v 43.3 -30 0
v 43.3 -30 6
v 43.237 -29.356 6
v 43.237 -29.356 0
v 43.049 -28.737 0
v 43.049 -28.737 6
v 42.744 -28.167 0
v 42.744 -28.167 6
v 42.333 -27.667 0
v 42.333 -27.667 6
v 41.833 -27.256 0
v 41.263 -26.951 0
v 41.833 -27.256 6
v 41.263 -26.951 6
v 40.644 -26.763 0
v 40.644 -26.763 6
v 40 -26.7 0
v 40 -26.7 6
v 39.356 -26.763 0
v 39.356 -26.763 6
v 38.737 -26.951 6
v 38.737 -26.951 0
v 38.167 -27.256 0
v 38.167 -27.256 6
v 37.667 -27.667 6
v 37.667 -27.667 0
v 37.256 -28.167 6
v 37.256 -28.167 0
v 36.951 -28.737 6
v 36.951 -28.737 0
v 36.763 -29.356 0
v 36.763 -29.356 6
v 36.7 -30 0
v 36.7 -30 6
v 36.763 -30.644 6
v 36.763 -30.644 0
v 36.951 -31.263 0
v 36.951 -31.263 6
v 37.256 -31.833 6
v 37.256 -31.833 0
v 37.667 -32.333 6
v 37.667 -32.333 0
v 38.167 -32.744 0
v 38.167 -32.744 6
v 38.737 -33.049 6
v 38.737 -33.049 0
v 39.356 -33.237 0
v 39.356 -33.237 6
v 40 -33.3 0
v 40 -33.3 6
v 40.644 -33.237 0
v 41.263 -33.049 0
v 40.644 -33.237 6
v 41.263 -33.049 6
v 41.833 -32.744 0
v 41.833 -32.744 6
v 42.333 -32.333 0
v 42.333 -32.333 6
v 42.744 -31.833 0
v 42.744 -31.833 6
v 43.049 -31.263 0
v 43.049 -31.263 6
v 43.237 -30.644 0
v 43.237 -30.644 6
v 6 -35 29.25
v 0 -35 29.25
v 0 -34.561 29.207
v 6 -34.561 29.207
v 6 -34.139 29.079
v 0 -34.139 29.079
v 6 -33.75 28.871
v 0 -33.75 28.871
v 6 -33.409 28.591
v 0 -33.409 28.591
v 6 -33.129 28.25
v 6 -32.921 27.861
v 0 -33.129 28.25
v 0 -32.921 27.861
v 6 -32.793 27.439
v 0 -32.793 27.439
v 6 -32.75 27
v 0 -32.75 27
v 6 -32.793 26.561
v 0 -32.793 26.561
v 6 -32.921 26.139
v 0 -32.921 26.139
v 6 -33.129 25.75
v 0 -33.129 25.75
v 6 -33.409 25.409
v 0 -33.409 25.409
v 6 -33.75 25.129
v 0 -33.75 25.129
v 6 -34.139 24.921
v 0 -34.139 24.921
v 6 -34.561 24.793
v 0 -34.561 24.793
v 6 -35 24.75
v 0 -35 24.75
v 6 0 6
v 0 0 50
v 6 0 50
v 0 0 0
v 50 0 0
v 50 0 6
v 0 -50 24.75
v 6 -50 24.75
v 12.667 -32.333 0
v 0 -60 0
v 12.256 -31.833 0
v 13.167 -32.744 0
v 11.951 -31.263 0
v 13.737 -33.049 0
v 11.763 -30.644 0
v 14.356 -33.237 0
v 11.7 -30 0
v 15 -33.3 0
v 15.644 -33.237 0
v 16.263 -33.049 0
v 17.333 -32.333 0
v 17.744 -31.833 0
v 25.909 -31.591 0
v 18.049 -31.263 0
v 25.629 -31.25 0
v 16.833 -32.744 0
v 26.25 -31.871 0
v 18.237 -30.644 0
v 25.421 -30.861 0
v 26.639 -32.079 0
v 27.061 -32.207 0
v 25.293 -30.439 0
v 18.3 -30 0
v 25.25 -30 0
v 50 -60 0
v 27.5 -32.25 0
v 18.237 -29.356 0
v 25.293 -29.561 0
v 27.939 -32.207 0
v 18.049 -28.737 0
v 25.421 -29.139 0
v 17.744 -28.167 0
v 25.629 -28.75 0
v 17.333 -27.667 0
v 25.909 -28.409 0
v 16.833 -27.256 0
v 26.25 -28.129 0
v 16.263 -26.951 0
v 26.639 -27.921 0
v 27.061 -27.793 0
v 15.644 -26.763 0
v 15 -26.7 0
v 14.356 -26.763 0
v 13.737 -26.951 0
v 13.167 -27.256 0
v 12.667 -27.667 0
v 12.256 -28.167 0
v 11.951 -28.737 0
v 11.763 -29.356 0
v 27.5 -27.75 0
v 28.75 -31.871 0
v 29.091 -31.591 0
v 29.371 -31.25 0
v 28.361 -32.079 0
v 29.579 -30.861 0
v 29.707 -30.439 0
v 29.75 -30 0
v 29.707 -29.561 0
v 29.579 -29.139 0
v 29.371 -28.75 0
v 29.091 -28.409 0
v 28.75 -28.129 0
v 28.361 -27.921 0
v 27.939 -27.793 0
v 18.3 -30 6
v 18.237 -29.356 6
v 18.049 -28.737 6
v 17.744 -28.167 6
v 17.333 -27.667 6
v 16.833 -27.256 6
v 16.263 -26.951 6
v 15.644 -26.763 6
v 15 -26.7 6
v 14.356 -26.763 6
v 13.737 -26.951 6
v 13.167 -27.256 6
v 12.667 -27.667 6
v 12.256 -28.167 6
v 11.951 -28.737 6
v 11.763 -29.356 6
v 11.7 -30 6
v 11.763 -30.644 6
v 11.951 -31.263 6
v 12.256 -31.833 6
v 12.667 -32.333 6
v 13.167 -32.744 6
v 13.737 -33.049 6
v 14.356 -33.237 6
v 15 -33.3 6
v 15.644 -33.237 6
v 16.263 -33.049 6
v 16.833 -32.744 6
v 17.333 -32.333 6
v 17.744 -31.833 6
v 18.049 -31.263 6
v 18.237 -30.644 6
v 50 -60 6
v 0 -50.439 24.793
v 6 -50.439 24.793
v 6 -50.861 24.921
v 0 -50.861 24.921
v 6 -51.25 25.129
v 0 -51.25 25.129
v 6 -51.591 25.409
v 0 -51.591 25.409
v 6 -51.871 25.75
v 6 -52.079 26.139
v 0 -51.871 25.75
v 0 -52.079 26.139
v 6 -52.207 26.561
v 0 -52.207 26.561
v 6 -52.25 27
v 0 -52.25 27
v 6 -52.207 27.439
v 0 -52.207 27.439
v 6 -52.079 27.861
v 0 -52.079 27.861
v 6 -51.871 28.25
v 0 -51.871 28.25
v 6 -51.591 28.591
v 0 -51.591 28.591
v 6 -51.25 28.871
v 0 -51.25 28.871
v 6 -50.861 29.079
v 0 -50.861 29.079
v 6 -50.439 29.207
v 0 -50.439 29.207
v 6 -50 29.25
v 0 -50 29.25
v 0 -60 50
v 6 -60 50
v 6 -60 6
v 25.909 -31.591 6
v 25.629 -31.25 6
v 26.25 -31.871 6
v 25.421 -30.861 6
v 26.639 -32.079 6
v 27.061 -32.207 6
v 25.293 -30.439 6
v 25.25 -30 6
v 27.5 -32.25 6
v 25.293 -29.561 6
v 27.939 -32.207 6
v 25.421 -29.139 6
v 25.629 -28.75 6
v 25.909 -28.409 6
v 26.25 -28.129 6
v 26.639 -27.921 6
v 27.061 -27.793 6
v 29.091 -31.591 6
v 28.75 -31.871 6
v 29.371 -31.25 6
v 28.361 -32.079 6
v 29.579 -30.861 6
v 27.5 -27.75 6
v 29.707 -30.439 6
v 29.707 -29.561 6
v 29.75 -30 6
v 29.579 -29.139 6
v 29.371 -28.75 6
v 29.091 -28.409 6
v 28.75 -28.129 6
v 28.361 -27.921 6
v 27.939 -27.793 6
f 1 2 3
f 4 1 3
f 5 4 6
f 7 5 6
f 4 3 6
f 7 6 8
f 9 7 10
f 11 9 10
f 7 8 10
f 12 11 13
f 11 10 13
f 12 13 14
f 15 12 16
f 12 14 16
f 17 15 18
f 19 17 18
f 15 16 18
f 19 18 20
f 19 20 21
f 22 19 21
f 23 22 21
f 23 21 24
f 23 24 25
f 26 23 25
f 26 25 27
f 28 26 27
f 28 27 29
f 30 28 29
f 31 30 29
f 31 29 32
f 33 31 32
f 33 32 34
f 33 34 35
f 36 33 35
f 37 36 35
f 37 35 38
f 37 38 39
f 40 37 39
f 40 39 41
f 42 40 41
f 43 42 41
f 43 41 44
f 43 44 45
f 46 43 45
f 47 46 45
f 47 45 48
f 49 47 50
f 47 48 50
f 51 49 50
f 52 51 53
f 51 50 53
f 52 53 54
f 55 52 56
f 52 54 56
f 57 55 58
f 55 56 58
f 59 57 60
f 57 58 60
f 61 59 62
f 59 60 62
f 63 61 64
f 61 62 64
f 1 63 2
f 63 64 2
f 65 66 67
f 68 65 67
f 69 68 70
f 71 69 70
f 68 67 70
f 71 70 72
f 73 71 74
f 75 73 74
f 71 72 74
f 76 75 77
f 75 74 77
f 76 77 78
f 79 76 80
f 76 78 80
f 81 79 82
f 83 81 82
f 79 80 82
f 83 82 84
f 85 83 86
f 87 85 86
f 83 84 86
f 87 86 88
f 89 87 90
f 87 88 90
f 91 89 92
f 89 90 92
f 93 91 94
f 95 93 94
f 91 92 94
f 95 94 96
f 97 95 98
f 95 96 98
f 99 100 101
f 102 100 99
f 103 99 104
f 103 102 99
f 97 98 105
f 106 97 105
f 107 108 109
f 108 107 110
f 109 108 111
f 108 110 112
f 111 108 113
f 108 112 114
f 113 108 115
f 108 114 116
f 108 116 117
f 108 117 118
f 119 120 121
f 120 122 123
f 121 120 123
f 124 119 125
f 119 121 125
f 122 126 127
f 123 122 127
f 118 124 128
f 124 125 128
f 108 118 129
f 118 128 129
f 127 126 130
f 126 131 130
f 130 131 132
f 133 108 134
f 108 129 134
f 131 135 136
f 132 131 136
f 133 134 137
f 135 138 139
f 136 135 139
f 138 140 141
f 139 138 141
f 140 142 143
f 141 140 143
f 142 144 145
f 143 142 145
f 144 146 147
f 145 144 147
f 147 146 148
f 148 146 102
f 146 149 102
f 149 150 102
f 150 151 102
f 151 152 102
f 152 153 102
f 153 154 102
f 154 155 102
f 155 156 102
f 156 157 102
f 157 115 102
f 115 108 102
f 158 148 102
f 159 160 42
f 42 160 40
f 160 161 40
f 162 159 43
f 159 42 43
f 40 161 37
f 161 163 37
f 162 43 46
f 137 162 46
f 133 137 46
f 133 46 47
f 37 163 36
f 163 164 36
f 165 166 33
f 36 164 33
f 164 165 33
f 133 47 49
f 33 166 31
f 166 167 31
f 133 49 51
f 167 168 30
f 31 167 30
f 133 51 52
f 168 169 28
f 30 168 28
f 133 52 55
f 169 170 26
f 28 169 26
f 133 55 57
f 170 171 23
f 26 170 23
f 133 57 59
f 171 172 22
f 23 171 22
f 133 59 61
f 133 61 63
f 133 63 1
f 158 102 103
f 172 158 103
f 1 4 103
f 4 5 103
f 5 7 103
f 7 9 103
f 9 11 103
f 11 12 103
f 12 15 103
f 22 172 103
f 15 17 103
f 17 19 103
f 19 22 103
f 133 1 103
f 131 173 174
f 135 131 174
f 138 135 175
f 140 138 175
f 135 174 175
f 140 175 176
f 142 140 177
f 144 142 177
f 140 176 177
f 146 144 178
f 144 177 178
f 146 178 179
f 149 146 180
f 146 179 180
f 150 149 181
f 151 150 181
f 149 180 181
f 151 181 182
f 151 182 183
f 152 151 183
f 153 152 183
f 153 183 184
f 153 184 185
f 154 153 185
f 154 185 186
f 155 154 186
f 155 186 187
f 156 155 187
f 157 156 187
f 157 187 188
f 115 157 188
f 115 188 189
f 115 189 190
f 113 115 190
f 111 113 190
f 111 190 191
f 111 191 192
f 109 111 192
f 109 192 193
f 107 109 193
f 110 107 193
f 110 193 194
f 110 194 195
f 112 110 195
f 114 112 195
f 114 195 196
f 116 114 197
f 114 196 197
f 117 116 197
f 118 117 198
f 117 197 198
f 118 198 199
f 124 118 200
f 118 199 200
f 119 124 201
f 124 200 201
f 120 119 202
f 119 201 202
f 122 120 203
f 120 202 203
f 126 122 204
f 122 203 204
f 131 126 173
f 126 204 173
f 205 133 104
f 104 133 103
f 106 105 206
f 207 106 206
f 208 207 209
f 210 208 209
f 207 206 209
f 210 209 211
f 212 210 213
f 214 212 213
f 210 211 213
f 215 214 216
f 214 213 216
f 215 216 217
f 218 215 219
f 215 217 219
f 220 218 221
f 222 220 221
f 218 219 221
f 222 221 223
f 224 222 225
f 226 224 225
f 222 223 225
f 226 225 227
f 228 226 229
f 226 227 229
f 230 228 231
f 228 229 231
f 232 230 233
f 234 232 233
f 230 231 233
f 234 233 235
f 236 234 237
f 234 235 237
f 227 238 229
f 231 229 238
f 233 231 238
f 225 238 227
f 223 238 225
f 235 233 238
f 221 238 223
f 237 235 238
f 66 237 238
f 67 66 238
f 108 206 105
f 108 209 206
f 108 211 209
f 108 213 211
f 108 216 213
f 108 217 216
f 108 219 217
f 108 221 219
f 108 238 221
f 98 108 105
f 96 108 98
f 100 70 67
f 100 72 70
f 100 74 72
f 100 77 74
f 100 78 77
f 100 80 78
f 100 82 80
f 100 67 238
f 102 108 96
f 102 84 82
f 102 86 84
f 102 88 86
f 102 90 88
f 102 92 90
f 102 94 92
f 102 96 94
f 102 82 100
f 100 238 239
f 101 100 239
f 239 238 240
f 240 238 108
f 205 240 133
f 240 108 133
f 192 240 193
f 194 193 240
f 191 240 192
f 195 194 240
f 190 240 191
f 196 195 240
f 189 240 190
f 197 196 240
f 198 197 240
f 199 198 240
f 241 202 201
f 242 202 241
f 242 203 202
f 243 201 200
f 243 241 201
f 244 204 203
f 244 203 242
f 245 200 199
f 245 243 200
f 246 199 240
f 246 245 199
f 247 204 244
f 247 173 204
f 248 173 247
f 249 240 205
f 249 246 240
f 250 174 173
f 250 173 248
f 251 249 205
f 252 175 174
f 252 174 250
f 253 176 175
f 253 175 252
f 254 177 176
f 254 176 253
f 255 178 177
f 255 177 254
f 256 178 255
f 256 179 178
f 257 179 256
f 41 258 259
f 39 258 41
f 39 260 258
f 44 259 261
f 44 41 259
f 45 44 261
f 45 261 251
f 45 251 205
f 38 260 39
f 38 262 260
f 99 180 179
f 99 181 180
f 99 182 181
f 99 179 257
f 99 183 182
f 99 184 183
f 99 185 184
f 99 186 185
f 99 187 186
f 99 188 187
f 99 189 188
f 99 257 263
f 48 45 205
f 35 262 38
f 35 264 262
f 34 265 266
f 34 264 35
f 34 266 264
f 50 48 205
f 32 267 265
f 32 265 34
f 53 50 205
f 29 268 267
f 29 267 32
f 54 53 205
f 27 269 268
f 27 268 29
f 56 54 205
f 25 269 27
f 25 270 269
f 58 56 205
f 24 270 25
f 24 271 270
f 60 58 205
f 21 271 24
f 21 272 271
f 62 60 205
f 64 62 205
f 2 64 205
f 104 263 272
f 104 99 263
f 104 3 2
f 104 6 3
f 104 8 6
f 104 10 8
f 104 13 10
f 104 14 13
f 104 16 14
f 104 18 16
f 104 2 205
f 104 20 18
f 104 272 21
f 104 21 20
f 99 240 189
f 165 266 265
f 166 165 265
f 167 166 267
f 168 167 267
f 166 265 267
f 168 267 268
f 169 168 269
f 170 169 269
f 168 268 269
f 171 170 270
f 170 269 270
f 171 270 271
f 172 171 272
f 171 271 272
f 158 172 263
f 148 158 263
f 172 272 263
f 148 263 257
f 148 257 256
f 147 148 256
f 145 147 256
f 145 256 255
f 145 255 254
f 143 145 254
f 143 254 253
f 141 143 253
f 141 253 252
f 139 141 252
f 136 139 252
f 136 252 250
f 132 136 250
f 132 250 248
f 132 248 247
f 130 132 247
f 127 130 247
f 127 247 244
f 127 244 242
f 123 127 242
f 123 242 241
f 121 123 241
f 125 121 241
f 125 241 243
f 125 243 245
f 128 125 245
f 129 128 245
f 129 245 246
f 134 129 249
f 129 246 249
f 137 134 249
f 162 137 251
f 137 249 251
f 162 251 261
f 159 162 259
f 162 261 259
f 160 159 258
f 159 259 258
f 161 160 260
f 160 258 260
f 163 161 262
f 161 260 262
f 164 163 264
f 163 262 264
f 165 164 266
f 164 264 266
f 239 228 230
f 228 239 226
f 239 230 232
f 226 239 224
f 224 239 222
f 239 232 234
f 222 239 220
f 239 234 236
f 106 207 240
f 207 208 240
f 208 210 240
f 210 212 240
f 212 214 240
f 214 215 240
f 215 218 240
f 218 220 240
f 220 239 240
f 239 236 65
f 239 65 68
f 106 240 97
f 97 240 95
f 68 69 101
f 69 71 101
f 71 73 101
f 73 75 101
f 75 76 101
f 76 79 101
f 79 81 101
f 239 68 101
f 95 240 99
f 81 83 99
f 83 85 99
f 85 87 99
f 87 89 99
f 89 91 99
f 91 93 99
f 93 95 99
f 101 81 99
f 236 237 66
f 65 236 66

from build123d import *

# Parameters (mm, degrees)
F0_W     = 50
F0_H     = 60
F1_DEPTH = 6
F2_W     = 6
F2_H     = 60
F3_DEPTH = 44
F5_DEPTH = 50.001
F6_R     = 2.25
F6_R_2   = 3.3
F7_DEPTH = 25


with BuildPart() as f1:
    # F0 (on Top) → F1 (new body)
    with BuildSketch(Plane.XY):
        with Locations((25, -30)):
            Rectangle(F0_W, F0_H)
    extrude(amount=F1_DEPTH)

    # F2 (on face) → F3 (join)
    with BuildSketch(Plane.XY.offset(6)):
        with Locations((3, -30)):
            Rectangle(F2_W, F2_H)
    extrude(amount=F3_DEPTH)

    # F4 (on face) → F5 (cut, through all)
    with BuildSketch(Plane(origin=(0, 0, 0), x_dir=(0, -1, 0), z_dir=(-1, 0, 0))):
        with BuildLine():
            Line((50, 29.25), (35, 29.25))
            ThreePointArc((35, 29.25), (32.75, 27), (35, 24.75))
            Line((35, 24.75), (50, 24.75))
            ThreePointArc((50, 24.75), (52.25, 27), (50, 29.25))
        make_face()
    extrude(amount=-F5_DEPTH, mode=Mode.SUBTRACT)

    # F6 (on face) → F7 (cut)
    with BuildSketch(Plane.XY.offset(6)):
        with Locations((27.5, -30)):
            Circle(F6_R)
        with Locations((15, -30)):
            Circle(F6_R_2)
        with Locations((40, -30)):
            Circle(F6_R_2)
    extrude(amount=-F7_DEPTH, mode=Mode.SUBTRACT)


solid = f1.part
